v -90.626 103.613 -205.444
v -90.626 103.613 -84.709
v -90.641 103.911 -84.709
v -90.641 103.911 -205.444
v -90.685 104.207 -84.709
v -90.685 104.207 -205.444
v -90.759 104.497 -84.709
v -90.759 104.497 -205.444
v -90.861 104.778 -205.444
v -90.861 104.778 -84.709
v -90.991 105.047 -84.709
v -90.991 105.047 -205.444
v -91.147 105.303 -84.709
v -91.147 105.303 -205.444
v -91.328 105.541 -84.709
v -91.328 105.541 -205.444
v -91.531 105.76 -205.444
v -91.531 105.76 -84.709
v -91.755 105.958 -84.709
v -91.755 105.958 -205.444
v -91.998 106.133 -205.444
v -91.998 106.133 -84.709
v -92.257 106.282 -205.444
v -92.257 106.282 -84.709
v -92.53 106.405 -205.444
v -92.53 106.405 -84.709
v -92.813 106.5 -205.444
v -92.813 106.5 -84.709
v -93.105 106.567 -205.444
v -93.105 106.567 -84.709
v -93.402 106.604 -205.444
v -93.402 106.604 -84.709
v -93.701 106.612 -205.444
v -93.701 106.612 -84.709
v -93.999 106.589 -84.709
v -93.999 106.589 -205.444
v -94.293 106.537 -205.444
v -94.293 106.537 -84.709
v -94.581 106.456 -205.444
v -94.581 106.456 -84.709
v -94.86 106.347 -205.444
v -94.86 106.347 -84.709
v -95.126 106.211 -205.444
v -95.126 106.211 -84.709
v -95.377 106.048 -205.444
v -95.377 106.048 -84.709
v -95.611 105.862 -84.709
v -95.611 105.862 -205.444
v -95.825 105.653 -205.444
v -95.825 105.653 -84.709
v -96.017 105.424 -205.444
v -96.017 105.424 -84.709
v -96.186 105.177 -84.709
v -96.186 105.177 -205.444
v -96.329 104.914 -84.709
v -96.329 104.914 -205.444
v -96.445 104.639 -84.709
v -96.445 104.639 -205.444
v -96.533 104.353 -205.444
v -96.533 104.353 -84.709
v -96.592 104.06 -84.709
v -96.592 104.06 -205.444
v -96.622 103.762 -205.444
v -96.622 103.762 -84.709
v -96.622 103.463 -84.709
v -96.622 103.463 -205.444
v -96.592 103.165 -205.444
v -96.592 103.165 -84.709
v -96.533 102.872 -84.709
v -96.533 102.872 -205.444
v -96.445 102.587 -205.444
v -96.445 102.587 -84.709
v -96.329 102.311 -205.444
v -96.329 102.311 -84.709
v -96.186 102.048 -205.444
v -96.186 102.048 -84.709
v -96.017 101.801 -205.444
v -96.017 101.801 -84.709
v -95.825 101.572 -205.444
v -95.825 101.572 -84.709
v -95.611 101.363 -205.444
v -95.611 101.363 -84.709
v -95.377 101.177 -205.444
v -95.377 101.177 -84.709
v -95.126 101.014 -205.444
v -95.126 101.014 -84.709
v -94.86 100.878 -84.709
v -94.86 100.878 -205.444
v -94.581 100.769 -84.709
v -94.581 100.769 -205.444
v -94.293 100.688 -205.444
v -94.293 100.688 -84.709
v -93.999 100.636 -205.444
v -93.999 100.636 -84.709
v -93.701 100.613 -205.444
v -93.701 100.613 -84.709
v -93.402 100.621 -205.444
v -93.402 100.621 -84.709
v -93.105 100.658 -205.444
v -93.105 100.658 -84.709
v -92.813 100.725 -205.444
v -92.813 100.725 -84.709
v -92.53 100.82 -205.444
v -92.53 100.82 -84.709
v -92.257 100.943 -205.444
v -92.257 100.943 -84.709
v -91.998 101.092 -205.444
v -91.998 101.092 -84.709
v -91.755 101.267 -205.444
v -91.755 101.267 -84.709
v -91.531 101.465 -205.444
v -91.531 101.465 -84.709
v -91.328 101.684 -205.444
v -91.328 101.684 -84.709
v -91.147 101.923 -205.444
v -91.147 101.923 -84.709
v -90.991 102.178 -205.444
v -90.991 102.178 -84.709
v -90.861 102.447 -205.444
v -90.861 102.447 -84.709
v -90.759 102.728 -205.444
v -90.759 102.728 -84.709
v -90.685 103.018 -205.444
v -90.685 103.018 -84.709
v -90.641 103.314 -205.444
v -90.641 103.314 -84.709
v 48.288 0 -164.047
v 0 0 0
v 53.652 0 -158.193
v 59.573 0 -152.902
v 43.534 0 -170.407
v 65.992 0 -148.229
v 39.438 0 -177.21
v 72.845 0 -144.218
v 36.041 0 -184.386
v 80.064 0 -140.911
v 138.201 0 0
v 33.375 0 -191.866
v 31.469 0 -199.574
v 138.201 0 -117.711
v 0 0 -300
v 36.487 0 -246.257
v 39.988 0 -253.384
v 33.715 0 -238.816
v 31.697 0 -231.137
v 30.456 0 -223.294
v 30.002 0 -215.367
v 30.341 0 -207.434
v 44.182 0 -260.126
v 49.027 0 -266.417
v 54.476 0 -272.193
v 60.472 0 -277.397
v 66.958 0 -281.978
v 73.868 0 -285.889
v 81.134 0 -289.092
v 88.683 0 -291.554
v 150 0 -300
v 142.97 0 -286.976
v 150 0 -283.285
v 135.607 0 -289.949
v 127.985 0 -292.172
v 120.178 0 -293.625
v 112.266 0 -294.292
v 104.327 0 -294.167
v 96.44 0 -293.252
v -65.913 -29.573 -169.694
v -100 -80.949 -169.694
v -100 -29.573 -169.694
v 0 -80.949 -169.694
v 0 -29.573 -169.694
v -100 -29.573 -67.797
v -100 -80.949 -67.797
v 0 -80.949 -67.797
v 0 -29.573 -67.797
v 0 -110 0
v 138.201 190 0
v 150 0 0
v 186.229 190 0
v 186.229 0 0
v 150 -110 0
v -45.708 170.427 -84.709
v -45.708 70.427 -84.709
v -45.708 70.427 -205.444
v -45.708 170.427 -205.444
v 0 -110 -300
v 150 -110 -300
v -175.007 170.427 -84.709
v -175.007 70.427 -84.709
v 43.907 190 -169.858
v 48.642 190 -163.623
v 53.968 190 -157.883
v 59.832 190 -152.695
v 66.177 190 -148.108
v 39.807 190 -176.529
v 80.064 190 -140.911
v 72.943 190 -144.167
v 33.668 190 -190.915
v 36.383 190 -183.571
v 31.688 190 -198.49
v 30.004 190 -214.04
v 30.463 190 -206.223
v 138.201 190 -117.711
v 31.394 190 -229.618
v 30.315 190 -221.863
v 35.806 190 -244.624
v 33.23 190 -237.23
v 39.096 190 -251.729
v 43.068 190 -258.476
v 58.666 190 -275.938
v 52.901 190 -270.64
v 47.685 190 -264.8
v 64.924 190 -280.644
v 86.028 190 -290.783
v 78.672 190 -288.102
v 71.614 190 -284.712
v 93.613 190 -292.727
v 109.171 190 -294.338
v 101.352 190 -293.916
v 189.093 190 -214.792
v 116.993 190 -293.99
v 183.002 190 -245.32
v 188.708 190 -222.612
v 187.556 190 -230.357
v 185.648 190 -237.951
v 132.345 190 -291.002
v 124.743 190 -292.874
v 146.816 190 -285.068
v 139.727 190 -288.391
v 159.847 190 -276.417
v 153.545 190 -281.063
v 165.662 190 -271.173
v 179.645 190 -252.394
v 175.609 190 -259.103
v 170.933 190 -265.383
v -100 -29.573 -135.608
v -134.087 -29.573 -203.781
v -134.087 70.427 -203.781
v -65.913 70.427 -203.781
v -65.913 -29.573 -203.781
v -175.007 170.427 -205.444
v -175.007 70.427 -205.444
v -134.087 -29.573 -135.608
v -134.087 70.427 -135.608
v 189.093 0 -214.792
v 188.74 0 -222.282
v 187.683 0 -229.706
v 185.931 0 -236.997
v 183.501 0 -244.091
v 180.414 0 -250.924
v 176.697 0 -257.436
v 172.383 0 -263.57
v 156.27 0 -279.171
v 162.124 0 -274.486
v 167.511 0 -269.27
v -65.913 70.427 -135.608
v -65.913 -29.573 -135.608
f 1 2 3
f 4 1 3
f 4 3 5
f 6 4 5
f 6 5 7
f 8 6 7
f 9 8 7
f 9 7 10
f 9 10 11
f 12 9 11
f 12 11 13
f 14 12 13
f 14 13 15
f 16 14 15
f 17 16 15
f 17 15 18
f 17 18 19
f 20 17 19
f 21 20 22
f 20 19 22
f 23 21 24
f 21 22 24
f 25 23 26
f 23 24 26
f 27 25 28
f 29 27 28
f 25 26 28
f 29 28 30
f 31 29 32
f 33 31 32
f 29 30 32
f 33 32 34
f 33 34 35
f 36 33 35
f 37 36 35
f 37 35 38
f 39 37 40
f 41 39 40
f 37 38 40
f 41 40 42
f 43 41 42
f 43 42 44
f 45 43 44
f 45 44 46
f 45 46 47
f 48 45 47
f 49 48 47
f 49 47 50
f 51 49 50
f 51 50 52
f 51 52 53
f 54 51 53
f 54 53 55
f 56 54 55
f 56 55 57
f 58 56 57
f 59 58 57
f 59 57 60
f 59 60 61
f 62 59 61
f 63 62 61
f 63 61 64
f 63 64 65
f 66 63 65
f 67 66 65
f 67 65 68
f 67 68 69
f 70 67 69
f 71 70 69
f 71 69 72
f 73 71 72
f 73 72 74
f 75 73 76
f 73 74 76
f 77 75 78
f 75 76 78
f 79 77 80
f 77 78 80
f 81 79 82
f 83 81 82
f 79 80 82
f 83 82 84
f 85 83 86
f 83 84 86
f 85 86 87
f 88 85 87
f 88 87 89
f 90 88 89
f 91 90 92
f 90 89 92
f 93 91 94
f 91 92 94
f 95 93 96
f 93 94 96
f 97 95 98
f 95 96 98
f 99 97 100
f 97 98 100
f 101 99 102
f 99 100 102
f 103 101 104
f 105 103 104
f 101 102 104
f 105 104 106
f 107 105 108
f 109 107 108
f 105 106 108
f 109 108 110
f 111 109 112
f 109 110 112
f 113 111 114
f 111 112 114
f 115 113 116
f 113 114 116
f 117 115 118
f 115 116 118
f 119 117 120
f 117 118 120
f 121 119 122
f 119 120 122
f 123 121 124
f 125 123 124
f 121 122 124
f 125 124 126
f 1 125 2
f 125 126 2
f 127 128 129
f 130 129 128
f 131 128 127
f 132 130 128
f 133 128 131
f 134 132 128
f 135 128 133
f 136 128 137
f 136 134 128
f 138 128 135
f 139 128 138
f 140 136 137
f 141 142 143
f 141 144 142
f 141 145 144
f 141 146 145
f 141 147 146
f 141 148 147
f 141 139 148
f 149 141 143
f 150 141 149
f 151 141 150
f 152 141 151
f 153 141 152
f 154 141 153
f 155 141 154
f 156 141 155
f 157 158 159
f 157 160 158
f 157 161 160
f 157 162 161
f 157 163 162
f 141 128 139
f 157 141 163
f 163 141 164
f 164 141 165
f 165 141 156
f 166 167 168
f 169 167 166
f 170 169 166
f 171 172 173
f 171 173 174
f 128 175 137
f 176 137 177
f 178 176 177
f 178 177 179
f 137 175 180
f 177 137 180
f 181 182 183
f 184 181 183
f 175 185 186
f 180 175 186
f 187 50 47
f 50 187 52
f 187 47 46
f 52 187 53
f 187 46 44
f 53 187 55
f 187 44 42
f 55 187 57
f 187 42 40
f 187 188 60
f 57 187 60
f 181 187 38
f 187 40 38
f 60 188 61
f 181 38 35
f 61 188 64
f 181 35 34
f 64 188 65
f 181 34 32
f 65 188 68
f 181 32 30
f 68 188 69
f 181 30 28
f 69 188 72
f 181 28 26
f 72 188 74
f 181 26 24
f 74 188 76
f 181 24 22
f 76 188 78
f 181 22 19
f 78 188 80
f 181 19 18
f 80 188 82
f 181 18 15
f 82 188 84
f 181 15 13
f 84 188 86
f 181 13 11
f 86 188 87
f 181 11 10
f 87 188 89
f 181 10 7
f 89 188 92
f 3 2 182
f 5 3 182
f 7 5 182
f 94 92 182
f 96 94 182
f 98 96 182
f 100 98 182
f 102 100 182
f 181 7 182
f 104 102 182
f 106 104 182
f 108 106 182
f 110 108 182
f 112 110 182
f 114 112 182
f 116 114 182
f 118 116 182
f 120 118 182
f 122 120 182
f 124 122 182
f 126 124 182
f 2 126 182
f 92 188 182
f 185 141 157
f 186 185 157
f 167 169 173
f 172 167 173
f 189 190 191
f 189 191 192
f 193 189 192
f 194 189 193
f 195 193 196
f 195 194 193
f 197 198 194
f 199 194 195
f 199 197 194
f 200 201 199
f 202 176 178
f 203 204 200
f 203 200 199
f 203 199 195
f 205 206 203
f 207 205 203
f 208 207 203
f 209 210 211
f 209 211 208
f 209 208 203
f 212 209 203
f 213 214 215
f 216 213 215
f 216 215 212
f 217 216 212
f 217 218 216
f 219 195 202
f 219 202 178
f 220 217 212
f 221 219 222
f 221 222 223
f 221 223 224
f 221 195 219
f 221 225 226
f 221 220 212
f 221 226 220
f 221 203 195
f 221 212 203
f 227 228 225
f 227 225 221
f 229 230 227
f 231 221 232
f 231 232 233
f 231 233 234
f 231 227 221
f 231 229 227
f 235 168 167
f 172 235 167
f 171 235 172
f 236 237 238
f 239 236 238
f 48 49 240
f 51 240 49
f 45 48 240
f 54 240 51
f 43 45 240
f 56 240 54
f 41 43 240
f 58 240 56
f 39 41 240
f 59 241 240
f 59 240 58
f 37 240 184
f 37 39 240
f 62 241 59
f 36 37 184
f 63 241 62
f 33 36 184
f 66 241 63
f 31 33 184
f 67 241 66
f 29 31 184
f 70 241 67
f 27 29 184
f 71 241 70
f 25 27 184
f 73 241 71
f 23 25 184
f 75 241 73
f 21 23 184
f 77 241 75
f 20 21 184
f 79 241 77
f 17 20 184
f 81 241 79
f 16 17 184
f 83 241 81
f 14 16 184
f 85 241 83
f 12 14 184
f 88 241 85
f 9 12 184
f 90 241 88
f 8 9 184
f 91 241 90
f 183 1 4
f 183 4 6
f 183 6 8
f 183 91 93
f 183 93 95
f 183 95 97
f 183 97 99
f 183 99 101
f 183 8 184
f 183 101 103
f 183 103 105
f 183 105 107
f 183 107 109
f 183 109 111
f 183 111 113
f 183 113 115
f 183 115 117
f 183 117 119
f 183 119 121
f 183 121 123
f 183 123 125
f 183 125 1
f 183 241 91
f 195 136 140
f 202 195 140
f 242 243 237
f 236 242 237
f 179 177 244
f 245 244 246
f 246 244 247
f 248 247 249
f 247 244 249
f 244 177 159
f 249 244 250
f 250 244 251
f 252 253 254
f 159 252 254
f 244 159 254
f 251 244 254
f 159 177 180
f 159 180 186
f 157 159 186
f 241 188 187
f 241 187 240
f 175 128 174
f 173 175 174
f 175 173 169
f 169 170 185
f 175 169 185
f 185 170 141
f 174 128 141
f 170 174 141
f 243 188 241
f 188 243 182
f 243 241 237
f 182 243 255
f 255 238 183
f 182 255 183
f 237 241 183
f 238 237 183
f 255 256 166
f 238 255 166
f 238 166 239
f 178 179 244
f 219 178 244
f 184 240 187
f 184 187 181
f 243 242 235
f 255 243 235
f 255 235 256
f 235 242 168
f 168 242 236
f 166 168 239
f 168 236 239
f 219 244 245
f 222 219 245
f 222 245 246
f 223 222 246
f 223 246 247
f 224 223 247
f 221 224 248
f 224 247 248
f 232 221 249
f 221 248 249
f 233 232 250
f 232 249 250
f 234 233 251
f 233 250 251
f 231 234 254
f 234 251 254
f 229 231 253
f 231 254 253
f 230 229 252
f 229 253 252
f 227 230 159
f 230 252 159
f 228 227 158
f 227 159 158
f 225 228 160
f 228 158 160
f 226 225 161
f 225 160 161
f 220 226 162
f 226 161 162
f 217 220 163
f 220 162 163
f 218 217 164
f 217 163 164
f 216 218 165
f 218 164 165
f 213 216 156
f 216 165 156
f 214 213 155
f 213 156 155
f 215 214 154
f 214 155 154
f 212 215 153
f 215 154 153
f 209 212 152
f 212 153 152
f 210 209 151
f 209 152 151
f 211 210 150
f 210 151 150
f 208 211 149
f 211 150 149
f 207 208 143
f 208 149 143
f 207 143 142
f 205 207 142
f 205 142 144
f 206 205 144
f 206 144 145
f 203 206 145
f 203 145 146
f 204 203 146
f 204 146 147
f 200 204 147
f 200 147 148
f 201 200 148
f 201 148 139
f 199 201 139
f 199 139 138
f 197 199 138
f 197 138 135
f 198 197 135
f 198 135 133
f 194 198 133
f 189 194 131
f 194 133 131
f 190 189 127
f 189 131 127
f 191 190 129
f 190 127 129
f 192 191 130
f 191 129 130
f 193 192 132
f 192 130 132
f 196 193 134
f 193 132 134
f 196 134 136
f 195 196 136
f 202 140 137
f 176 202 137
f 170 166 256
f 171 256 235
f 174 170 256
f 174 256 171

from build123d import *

# Parameters (mm, degrees)
SKETCH1_W           = 150
SKETCH1_H           = 300
BOSS_EXTRUDE1_DEPTH = 110
BOSS_EXTRUDE2_DEPTH = 190
SKETCH3_W           = 101.897148024
SKETCH3_H           = 51.376713289
BOSS_EXTRUDE3_DEPTH = 100
SKETCH4_W           = 68.173568538
SKETCH4_H           = 68.173568538
BOSS_EXTRUDE4_DEPTH = 100
SKETCH5_W           = 129.298061779
SKETCH5_H           = 120.735276231
BOSS_EXTRUDE5_DEPTH = 100
SKETCH6_R           = 3
CUT_EXTRUDE1_DEPTH  = 160


with BuildPart() as part:
    # Sketch1 → Boss-Extrude1 (new body)
    with BuildSketch(Plane(origin=(0, 0, 0), x_dir=(1, 0, 0), z_dir=(0, 1, 0))):
        with Locations((75, 150)):
            Rectangle(SKETCH1_W, SKETCH1_H)
    extrude(amount=-BOSS_EXTRUDE1_DEPTH)

    # Sketch2 → Boss-Extrude2 (add)
    with BuildSketch(Plane(origin=(0, 0, 0), x_dir=(1, 0, 0), z_dir=(0, 1, 0))):
        with BuildLine():
            Line((80.063819978, 140.910835022), (138.200643085, 117.710875285))
            Line((138.200643085, 117.710875285), (138.200643085, 0))
            Line((138.200643085, 0), (186.229076195, 0))
            Line((186.229076195, 0), (189.093435683, 214.792084693))
            ThreePointArc((189.093435683, 214.792084693), (64.923783369, 280.6439946), (80.063819978, 140.910835022))
        make_face()
    extrude(amount=BOSS_EXTRUDE2_DEPTH)

    # Sketch3 → Boss-Extrude3 (add)
    with BuildSketch(Plane.ZY):
        with Locations((-118.745807749, -55.260989225)):
            Rectangle(SKETCH3_W, SKETCH3_H)
    extrude(amount=BOSS_EXTRUDE3_DEPTH)

    # Sketch4 → Boss-Extrude4 (add)
    with BuildSketch(Plane(origin=(0, -29.57263258, 0), x_dir=(1, 0, 0), z_dir=(0, 1, 0))):
        with Locations((-100, 169.694381761)):
            Rectangle(SKETCH4_W, SKETCH4_H)
    extrude(amount=BOSS_EXTRUDE4_DEPTH)

    # Sketch5 → Boss-Extrude5 (add)
    with BuildSketch(Plane(origin=(0, 70.42736742, 0), x_dir=(1, 0, 0), z_dir=(0, 1, 0))):
        with Locations((-110.357521621, 145.07637331)):
            Rectangle(SKETCH5_W, SKETCH5_H)
    extrude(amount=BOSS_EXTRUDE5_DEPTH)

    # Sketch6 → Cut-Extrude1 (cut)
    with BuildSketch(Plane.XY.offset(-84.708735194)):
        with Locations((-93.625898684, 103.612565913)):
            Circle(SKETCH6_R)
    extrude(amount=-CUT_EXTRUDE1_DEPTH, mode=Mode.SUBTRACT)


solid = part.part
